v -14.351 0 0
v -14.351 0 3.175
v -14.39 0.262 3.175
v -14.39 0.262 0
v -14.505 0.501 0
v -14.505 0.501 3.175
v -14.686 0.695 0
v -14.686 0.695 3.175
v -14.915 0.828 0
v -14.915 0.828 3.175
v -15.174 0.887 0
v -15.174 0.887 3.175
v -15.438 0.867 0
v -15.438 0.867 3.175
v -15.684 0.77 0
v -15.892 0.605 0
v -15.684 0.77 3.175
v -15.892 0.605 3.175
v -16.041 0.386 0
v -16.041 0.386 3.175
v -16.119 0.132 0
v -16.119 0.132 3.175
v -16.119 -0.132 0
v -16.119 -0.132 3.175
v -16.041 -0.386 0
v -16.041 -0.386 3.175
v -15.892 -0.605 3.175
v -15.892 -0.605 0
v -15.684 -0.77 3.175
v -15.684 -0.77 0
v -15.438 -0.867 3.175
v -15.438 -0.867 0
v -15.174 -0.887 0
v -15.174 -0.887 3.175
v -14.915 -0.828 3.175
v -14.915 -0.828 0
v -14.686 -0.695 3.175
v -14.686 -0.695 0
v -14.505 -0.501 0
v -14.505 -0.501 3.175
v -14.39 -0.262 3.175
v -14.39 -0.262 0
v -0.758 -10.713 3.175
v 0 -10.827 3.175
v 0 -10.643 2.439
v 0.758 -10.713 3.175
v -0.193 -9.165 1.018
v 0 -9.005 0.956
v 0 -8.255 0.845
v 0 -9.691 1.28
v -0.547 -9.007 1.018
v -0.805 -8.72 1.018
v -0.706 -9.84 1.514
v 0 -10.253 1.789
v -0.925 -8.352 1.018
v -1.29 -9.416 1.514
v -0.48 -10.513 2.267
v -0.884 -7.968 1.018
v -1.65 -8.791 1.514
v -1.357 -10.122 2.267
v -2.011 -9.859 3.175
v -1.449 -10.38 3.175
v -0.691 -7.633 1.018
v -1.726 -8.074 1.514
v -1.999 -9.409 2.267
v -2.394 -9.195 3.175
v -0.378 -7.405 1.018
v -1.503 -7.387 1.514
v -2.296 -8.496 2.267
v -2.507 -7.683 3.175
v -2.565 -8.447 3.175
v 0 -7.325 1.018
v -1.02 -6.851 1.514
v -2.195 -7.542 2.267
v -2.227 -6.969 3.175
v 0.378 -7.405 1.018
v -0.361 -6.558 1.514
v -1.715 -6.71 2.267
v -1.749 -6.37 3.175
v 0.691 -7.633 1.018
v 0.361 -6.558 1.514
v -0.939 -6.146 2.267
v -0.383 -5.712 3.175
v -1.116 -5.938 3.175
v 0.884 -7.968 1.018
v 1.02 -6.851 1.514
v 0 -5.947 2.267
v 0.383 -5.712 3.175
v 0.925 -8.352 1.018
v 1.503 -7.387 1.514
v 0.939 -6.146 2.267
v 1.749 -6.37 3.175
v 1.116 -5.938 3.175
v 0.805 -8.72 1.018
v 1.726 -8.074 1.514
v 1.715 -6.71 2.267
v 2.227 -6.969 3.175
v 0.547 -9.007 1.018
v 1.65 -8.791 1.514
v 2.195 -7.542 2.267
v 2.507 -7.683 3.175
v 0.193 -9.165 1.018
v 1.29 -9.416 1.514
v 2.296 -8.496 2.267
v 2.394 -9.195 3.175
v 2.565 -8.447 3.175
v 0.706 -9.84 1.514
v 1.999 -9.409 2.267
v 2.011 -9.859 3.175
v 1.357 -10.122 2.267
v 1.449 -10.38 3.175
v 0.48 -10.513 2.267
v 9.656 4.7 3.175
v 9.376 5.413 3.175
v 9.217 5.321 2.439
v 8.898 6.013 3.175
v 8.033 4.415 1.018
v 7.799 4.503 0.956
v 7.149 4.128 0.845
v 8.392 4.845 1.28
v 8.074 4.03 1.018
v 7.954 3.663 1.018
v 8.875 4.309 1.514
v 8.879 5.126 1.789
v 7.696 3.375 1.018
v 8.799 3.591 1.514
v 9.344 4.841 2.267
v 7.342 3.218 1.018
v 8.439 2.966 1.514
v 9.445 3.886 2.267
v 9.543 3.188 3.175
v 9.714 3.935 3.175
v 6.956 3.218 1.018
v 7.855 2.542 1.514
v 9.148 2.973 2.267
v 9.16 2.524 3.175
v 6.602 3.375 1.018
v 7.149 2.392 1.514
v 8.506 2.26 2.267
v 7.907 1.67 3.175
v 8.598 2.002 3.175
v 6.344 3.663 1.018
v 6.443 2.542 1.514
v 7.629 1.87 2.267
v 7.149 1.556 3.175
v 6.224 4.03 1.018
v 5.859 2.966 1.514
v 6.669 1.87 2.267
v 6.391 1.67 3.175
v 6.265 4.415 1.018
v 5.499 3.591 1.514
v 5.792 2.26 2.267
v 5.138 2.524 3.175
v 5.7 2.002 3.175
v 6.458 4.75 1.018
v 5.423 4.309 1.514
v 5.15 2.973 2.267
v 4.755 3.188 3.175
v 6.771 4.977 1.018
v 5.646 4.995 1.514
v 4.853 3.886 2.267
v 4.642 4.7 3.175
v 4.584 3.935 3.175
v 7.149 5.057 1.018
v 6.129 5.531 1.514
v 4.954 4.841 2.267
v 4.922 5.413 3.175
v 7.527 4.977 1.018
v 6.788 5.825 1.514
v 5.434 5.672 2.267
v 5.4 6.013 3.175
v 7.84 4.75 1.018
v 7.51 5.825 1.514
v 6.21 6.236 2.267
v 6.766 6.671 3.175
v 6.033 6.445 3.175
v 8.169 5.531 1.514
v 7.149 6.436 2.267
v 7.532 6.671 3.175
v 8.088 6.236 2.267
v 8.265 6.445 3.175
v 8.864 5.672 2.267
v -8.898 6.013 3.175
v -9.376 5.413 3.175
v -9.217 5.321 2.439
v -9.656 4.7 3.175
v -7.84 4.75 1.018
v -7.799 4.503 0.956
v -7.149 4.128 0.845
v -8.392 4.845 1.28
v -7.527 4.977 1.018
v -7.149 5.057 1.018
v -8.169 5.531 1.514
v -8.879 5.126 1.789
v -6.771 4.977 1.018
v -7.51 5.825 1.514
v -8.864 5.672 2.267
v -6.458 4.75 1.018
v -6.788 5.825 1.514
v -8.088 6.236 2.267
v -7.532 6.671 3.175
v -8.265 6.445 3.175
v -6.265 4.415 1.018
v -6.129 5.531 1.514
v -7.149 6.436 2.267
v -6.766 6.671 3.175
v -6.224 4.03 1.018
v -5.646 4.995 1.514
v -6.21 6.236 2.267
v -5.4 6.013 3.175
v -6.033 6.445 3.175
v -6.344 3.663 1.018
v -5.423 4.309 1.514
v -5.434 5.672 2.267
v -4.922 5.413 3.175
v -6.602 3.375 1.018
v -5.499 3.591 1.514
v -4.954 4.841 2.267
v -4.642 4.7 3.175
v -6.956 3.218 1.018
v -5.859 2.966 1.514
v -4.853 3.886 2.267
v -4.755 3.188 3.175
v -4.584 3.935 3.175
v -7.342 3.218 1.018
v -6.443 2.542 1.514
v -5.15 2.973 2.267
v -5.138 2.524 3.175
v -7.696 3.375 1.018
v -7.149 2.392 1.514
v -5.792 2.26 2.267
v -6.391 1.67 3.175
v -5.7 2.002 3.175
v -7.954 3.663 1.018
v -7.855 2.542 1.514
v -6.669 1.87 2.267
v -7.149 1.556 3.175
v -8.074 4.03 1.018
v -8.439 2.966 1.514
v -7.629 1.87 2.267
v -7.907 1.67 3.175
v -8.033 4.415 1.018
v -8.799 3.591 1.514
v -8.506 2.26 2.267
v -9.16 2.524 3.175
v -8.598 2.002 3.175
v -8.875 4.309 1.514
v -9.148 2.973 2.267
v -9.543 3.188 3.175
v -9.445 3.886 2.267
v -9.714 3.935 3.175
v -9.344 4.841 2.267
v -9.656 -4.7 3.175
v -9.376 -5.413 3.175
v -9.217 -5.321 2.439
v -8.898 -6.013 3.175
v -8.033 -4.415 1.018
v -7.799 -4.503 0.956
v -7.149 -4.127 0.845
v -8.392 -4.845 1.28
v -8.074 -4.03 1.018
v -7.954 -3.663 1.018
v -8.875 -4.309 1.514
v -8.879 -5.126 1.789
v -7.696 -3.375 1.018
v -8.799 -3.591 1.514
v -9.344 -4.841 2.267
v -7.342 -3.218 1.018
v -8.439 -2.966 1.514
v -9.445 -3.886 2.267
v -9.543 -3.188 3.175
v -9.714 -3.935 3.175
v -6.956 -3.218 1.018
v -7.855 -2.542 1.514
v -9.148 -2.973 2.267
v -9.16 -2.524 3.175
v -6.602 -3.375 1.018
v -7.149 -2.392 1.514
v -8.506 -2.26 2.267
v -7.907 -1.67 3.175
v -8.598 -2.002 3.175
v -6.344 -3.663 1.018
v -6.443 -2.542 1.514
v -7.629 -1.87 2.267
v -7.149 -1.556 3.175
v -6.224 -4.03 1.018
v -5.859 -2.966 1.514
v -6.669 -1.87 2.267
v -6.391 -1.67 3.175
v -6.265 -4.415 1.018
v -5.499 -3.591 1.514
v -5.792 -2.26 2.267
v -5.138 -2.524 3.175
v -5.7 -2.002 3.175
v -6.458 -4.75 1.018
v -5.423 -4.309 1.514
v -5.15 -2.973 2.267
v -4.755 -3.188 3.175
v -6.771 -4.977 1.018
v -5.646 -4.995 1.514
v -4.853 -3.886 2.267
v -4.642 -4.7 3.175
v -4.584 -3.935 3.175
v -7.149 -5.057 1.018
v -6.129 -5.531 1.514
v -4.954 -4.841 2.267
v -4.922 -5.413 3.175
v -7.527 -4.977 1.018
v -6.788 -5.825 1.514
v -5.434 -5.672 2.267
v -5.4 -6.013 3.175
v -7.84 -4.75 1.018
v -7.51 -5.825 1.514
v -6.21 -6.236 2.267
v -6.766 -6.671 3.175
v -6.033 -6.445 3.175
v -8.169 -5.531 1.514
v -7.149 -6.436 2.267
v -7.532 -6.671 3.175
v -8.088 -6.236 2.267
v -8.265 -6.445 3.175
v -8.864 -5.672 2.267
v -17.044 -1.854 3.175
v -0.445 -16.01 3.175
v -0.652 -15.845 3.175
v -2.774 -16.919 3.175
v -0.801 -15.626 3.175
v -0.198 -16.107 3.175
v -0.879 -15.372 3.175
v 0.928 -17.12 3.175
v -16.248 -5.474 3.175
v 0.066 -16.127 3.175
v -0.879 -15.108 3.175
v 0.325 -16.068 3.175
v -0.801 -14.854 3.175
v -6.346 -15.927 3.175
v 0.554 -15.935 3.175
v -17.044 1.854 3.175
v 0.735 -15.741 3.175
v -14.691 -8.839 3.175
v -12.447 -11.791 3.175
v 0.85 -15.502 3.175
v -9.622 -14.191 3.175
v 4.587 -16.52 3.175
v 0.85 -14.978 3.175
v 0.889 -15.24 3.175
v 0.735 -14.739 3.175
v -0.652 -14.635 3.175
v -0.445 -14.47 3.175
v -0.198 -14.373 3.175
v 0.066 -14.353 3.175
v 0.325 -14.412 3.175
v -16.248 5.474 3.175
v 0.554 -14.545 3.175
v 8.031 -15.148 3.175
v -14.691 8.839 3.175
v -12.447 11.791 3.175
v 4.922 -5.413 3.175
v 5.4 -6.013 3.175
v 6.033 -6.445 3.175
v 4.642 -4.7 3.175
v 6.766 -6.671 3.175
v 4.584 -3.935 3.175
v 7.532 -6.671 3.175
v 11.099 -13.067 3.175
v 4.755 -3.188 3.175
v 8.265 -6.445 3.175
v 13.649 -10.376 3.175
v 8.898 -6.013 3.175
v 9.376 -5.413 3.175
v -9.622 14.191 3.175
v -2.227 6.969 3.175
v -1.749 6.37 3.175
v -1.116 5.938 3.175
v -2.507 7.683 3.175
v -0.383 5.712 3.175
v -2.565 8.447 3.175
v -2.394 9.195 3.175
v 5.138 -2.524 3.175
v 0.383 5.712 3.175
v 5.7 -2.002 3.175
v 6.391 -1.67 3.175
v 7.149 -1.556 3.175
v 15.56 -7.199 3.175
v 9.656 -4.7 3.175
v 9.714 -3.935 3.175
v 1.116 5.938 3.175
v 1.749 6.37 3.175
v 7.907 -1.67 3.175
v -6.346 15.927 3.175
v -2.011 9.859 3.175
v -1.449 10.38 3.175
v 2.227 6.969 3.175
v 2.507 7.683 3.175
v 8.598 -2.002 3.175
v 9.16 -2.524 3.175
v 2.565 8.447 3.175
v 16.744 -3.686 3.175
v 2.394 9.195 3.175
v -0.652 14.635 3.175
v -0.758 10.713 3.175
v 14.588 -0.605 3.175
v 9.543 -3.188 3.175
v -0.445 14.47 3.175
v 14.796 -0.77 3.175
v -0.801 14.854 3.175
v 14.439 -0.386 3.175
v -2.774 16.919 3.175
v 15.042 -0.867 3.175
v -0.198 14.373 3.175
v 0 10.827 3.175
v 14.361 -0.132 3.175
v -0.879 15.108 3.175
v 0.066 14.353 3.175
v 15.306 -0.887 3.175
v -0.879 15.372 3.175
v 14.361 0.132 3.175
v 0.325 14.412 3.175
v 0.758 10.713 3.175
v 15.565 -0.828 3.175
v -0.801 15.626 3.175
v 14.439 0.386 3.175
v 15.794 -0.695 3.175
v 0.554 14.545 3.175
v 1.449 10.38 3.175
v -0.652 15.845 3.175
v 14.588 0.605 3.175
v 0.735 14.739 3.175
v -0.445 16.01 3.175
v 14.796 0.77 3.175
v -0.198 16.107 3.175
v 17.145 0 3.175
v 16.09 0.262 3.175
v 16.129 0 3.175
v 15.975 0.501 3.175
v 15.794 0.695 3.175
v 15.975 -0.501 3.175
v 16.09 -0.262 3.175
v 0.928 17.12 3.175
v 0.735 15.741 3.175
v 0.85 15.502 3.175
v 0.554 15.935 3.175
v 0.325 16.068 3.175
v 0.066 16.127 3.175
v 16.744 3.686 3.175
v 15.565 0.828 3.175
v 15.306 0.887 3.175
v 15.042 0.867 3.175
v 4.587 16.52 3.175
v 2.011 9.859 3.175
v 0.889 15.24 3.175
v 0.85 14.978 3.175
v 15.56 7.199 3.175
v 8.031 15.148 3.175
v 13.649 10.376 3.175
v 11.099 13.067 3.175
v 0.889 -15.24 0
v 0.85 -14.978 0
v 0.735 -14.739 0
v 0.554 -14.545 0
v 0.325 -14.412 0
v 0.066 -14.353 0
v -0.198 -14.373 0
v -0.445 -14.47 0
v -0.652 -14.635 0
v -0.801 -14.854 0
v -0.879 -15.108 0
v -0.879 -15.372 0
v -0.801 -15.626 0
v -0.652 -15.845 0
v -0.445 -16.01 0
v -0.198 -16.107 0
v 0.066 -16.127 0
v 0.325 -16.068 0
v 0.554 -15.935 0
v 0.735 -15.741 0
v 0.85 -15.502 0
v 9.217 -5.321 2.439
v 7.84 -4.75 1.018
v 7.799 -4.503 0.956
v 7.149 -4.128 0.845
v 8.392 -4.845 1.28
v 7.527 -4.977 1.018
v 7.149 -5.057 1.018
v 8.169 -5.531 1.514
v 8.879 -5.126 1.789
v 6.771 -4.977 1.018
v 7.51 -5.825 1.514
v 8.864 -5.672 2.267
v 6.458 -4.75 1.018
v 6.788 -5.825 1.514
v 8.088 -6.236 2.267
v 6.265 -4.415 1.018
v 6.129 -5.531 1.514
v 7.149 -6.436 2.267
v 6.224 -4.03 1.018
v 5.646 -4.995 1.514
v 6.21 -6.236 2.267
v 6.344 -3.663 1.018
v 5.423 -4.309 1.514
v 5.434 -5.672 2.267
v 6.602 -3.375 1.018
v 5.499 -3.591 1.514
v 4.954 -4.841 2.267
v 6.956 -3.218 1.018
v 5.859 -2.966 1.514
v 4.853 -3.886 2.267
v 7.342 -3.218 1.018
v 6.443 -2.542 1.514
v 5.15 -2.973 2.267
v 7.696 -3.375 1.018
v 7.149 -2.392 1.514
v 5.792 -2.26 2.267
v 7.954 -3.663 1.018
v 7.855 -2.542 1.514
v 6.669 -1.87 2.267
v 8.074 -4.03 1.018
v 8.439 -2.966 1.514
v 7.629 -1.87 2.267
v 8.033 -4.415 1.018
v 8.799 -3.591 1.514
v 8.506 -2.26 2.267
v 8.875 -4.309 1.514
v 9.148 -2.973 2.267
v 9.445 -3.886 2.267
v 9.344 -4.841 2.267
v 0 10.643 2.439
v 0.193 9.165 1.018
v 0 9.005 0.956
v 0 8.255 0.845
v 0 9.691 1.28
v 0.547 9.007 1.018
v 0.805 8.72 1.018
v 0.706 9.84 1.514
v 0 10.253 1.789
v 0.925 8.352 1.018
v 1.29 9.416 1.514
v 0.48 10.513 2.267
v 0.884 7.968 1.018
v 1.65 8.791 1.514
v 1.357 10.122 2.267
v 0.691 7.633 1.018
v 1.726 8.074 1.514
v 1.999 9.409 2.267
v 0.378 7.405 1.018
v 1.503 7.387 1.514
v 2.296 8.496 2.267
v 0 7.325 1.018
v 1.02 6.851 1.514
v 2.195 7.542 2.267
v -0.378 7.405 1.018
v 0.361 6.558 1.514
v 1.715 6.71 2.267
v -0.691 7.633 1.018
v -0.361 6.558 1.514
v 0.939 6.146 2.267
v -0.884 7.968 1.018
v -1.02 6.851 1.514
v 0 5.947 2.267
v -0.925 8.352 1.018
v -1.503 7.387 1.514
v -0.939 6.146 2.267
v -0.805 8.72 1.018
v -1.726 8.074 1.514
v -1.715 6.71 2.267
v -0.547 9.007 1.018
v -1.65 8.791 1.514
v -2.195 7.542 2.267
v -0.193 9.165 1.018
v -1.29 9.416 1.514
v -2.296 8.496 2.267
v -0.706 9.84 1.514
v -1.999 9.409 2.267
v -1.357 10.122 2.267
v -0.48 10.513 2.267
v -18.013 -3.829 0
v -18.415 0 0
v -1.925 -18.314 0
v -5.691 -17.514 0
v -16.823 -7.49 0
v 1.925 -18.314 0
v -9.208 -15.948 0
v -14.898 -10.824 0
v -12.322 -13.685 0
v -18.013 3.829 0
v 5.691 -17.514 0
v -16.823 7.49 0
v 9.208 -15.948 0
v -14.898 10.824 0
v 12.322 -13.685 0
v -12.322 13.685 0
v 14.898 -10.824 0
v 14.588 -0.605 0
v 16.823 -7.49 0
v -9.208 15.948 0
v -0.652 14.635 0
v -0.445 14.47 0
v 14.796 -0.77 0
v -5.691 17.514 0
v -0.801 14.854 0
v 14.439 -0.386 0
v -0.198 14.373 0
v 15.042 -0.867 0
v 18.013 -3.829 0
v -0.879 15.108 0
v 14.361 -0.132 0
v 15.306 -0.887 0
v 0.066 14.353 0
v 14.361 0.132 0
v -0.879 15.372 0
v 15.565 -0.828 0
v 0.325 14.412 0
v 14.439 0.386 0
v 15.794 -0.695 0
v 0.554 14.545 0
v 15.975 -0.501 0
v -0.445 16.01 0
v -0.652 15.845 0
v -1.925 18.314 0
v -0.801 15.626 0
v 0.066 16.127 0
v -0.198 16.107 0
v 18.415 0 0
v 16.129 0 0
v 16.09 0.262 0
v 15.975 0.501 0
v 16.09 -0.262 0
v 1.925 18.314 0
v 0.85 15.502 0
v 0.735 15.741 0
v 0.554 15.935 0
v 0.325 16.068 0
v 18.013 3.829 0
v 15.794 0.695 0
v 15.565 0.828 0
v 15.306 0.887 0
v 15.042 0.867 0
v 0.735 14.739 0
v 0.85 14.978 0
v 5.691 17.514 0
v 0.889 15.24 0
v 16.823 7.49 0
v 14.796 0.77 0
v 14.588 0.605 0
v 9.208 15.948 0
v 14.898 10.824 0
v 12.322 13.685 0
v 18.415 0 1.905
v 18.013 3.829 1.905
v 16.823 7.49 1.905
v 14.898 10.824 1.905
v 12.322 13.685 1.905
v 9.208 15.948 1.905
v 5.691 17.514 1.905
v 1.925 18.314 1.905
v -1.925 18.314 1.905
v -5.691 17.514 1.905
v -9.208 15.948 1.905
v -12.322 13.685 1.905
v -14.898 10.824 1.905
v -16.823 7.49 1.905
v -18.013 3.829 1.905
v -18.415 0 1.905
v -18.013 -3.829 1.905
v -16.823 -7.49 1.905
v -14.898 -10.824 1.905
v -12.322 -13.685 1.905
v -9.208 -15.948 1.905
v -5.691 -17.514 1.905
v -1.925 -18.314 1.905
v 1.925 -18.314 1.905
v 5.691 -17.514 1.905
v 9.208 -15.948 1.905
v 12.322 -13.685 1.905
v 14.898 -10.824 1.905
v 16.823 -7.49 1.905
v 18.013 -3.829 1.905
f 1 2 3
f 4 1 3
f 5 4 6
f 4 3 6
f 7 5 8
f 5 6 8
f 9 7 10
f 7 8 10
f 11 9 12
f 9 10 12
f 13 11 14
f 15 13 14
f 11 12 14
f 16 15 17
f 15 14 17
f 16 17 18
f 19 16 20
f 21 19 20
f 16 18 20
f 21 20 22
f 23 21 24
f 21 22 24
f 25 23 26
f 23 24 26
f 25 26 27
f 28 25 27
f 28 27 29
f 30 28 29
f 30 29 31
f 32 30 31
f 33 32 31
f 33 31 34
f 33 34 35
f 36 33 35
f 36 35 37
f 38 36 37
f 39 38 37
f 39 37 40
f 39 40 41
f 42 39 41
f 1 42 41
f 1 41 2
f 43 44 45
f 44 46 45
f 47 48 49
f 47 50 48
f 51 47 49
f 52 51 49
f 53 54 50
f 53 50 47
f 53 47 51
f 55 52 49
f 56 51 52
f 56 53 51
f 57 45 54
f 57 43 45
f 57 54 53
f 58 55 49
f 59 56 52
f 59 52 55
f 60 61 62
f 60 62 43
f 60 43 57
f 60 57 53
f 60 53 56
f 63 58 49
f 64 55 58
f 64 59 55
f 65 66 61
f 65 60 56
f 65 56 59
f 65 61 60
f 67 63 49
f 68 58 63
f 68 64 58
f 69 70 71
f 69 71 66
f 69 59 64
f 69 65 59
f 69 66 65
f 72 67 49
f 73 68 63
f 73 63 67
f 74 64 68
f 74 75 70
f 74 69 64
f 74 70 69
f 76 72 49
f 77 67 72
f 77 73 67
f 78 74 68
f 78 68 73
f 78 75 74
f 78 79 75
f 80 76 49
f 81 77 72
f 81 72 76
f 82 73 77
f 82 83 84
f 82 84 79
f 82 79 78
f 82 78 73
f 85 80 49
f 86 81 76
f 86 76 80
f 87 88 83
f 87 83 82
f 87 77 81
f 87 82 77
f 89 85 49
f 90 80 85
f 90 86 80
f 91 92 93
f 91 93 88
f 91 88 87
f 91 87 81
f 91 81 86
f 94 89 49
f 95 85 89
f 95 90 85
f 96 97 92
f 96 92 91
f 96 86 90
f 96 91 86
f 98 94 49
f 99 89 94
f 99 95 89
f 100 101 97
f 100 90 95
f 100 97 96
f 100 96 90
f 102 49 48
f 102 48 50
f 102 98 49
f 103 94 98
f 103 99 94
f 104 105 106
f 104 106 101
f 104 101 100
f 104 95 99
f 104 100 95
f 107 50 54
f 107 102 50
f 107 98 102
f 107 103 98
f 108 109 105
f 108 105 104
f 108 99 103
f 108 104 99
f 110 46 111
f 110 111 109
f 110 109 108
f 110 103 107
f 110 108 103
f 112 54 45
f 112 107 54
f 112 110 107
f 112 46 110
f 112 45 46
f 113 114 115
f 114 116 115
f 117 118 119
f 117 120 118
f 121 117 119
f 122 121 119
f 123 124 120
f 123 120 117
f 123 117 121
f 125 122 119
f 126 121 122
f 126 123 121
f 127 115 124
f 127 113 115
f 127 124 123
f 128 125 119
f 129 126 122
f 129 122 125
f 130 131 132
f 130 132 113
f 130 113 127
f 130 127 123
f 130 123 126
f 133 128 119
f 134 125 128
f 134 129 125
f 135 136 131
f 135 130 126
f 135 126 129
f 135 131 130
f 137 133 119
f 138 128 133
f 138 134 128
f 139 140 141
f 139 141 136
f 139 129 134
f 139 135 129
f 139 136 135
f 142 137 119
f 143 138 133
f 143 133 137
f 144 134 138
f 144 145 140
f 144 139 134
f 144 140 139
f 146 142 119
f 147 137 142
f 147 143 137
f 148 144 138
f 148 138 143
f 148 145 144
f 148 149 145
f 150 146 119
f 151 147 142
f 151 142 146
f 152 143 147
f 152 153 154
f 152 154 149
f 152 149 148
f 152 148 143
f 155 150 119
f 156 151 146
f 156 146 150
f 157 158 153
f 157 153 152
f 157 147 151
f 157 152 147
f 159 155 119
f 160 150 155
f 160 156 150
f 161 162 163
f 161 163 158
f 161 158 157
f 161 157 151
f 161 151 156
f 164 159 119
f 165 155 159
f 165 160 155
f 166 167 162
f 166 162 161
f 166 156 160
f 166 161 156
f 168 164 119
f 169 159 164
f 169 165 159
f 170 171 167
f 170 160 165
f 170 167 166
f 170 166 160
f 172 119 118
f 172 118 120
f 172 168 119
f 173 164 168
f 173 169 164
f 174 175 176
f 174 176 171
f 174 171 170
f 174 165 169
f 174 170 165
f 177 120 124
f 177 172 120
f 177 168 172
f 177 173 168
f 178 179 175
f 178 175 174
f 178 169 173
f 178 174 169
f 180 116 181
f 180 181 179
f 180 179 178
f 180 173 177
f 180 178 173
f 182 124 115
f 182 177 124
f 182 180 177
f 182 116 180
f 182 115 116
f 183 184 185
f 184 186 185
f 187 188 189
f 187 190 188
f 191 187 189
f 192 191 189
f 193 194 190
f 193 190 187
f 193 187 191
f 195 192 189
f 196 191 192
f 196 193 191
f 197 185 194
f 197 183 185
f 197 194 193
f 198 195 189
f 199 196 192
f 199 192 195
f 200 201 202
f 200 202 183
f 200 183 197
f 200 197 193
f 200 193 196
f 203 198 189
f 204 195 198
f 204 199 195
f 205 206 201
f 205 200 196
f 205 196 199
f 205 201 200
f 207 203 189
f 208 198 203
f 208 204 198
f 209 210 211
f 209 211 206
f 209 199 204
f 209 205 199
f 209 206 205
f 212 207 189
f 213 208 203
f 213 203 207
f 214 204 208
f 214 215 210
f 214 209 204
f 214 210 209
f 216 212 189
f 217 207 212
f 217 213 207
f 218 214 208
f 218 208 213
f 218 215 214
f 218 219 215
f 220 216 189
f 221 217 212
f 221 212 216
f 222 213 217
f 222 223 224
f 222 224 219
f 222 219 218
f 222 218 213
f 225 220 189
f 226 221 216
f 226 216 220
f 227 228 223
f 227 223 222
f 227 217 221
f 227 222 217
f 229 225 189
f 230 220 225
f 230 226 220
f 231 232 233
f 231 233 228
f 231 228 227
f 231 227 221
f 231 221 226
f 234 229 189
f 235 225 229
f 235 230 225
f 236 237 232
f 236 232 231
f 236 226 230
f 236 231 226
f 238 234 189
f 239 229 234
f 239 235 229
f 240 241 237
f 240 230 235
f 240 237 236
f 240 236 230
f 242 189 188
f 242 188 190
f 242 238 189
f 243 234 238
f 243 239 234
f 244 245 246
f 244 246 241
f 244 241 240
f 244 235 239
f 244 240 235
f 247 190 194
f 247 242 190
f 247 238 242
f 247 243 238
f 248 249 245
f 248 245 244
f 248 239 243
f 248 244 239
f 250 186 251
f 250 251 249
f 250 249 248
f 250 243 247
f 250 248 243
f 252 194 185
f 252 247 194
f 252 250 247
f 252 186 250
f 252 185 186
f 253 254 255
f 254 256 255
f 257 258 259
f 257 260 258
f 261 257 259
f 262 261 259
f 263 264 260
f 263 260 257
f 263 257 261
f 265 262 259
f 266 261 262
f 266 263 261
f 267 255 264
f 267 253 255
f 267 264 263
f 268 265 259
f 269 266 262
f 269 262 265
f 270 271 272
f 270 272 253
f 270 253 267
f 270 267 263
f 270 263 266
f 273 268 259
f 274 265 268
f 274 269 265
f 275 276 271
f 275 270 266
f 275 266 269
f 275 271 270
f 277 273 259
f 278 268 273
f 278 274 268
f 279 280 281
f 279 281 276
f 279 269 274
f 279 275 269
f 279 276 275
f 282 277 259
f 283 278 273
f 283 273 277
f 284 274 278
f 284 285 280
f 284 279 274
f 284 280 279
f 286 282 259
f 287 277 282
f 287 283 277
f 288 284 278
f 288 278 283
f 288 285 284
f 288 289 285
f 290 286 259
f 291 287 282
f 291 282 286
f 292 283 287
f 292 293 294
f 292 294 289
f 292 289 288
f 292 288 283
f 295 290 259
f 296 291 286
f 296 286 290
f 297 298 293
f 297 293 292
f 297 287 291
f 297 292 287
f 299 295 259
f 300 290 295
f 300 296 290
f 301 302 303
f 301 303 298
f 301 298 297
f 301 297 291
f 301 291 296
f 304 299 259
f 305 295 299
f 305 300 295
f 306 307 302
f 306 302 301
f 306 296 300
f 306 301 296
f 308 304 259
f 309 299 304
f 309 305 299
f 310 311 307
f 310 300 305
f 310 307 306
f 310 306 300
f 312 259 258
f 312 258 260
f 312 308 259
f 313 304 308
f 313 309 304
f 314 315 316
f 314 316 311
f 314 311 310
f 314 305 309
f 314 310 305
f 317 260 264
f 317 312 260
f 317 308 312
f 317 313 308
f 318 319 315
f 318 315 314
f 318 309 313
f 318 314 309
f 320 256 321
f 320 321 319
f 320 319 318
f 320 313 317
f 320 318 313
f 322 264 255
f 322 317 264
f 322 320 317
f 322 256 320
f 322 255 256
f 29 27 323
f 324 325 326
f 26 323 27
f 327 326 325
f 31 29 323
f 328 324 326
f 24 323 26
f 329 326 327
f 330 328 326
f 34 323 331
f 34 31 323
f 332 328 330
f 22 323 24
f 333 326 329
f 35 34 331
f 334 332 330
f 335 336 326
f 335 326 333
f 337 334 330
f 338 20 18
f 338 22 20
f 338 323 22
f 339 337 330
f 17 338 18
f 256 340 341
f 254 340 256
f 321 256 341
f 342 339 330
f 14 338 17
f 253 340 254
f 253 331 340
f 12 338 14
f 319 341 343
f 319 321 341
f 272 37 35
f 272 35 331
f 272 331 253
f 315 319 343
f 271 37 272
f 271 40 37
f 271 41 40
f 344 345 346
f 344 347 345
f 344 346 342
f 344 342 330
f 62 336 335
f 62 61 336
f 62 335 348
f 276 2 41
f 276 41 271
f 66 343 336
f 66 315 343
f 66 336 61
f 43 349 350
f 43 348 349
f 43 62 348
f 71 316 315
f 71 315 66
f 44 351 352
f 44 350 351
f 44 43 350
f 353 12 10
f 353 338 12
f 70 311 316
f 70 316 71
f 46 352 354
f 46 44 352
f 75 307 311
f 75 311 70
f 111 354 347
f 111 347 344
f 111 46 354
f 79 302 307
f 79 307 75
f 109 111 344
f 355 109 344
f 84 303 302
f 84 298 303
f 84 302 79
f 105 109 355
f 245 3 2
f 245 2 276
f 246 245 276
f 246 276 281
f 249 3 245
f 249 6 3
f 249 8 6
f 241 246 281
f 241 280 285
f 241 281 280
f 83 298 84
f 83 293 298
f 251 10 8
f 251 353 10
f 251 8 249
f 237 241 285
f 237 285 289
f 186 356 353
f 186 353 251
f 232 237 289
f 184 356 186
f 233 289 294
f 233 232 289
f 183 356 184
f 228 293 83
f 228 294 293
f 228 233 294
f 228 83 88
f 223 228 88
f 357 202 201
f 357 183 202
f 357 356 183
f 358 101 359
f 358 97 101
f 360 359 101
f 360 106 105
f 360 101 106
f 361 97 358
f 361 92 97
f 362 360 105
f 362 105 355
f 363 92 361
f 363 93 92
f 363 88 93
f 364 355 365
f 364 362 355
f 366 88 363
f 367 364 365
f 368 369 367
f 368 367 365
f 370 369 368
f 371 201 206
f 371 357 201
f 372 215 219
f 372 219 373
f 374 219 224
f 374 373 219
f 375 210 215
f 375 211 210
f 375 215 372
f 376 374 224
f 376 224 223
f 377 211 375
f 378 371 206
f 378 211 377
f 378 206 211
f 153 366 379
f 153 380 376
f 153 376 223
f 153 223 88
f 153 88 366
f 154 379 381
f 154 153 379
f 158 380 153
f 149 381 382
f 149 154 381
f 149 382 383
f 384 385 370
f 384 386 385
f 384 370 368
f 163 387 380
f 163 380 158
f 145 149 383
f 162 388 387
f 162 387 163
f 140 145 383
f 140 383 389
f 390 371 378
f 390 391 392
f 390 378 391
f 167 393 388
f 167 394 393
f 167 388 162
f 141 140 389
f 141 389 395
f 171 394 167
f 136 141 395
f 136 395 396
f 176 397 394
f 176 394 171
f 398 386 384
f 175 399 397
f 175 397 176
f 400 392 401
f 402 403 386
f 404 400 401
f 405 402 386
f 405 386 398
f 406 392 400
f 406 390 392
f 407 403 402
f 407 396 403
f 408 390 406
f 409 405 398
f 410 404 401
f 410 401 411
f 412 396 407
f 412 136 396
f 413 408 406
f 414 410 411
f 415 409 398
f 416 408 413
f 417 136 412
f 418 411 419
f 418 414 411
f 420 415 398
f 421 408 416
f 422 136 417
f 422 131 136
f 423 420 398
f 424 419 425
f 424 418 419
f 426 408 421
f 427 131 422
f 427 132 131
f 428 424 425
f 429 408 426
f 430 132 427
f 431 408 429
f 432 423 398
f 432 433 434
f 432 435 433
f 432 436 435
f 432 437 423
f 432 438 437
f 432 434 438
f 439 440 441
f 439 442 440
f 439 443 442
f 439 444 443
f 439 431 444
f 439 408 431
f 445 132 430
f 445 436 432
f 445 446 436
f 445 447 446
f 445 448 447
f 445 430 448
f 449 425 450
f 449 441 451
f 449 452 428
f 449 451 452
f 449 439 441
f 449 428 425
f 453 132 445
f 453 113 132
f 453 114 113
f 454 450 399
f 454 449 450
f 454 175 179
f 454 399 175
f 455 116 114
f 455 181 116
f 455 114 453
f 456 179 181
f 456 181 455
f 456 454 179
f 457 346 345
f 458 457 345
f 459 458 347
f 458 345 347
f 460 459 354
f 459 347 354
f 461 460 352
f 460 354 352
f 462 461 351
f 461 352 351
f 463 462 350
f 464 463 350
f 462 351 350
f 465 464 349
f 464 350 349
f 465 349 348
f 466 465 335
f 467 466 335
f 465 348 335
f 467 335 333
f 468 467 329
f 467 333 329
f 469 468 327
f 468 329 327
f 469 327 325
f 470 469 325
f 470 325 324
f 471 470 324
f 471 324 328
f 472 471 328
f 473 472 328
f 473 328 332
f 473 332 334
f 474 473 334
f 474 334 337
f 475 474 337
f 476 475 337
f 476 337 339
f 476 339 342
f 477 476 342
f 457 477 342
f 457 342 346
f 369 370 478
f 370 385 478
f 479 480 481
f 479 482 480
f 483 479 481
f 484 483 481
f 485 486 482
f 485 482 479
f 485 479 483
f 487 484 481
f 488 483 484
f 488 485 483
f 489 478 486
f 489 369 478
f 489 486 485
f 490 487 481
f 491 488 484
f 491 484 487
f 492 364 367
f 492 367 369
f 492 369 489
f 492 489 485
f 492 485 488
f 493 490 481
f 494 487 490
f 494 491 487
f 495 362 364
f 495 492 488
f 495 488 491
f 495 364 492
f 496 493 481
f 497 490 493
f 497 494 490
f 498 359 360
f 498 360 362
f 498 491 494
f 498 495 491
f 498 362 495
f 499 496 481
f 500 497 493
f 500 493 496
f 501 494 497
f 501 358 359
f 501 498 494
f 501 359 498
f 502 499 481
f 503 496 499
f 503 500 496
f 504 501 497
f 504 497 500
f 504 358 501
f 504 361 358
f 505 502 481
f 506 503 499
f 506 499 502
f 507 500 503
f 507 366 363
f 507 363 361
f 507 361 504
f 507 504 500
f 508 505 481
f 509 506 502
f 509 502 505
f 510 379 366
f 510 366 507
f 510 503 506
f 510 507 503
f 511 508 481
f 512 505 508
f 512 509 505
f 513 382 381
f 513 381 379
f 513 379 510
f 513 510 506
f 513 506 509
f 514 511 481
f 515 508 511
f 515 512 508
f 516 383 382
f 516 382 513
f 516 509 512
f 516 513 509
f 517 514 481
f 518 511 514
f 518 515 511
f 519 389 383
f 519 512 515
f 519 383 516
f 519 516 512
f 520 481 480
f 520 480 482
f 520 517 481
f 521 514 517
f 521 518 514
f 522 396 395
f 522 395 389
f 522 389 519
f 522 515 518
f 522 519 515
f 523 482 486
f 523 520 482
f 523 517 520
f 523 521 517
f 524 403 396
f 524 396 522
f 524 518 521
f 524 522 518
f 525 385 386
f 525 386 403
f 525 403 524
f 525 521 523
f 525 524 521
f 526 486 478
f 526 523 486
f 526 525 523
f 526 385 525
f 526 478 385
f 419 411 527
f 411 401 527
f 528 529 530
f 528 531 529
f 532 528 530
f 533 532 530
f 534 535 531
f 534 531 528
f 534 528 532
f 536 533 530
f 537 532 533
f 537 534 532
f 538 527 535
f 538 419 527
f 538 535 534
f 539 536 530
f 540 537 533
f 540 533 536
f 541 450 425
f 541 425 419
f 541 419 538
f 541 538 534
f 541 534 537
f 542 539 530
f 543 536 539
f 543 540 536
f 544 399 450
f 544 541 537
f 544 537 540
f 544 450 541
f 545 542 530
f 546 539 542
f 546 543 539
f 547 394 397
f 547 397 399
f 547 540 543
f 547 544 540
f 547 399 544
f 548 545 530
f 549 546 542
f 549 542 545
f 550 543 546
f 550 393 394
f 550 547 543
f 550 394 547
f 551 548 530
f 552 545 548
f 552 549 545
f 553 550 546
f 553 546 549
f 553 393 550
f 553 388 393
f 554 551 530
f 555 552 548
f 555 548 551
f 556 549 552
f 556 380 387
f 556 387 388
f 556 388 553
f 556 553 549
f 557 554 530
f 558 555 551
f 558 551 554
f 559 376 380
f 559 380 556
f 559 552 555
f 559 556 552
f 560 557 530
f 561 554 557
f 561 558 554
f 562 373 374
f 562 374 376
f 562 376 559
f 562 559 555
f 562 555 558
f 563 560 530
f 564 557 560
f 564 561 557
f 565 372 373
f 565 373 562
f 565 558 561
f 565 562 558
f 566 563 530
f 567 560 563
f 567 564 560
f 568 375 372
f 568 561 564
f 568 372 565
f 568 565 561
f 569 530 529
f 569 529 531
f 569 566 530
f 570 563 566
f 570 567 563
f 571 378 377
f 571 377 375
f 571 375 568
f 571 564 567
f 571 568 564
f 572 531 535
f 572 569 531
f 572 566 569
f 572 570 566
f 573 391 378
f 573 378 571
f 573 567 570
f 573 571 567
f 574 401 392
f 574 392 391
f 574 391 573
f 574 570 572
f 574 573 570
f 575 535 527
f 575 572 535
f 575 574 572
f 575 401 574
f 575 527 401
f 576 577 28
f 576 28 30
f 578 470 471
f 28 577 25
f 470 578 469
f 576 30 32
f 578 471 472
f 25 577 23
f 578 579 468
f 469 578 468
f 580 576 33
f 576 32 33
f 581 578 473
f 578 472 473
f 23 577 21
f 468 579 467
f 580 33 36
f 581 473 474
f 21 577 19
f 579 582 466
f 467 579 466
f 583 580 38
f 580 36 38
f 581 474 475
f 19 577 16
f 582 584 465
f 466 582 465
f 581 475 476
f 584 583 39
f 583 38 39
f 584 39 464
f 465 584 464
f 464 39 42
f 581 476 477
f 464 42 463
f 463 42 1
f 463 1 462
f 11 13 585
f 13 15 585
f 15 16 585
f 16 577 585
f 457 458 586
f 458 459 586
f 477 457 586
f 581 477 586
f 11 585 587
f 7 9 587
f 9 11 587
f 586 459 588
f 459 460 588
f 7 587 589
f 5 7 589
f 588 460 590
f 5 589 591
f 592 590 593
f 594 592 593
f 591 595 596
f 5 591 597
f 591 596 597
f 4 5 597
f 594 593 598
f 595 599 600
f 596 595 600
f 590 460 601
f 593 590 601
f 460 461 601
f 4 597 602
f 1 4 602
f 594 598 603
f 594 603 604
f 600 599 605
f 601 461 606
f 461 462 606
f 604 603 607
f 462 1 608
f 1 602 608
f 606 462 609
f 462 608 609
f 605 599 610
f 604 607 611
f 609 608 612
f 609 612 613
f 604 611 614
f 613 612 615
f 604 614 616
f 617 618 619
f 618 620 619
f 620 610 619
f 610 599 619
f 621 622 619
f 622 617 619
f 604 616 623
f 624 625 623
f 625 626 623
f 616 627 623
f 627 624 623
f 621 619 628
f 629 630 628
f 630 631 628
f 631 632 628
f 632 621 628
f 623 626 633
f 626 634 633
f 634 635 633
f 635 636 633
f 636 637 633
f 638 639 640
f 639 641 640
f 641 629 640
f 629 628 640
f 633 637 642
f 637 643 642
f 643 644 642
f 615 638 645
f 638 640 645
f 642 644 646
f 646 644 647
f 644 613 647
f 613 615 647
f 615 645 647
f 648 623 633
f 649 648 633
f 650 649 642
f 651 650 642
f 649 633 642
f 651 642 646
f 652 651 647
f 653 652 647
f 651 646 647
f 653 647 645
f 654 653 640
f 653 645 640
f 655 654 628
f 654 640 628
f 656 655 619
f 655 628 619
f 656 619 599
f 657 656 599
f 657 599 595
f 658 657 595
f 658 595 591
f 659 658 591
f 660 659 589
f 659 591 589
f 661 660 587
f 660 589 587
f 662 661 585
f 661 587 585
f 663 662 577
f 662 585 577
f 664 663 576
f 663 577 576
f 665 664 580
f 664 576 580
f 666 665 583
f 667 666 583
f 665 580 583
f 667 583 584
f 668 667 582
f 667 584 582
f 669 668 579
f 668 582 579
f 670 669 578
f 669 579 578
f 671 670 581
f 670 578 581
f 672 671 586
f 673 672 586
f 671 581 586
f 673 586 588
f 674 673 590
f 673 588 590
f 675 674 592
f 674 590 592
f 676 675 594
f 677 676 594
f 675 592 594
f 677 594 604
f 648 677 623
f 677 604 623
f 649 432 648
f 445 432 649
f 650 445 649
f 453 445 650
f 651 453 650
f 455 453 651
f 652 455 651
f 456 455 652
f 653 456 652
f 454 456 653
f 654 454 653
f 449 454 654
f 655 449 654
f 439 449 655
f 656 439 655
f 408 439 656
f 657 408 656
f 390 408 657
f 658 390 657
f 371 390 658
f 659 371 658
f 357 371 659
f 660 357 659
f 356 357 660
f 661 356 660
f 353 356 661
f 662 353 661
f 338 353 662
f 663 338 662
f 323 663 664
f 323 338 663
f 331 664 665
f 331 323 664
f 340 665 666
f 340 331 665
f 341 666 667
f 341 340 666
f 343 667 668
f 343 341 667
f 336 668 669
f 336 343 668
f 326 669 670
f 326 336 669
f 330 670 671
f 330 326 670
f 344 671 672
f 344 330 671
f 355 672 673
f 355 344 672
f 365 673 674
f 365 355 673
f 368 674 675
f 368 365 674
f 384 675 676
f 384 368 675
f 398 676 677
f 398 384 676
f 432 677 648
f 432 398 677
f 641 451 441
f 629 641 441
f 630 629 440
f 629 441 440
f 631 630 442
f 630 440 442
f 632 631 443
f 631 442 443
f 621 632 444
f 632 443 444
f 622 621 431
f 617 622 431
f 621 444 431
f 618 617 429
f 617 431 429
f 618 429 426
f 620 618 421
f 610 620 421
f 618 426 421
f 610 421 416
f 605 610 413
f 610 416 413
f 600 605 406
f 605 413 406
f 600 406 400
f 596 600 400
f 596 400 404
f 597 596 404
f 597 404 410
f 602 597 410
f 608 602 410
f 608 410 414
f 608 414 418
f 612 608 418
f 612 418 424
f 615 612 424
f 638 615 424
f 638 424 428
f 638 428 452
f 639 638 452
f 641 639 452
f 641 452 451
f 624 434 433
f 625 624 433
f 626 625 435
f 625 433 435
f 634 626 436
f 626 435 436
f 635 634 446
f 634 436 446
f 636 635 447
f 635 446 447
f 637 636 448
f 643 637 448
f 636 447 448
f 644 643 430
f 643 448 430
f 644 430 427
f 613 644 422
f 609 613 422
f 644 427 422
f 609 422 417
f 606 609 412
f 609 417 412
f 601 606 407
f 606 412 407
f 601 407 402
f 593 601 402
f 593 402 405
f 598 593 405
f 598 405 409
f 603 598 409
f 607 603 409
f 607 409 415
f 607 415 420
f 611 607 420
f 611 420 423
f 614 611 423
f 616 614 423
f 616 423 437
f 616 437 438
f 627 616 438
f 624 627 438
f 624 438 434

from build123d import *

# Parameters (mm, degrees)
SKETCH1_R             = 18.415
BOSS_EXTRUDE1_DEPTH   = 3.175
CIRPATTERN1_COUNT     = 6
F_2_56_TAPPED_HOLE1_D = 1.778
CHAMFER1_SIZE         = 1.27


with BuildPart() as part:
    # Sketch1 → Boss-Extrude1 (new body)
    with BuildSketch(Plane.XY):
        Circle(SKETCH1_R)
    extrude(amount=BOSS_EXTRUDE1_DEPTH)

    # Sketch3 → Cut-Revolve1 (revolve, cut)
    with BuildSketch(Plane(origin=(0, 0, 0), x_dir=(0, 0, -1), z_dir=(1, 0, 0))):
        with BuildLine():
            Line((-6.01345, 8.255), (-0.84455, 8.255))
            ThreePointArc((-0.84455, 8.255), (-3.429, 10.83945), (-6.01345, 8.255))
        make_face()
    cut_revolve1 = revolve(axis=Axis((0, 8.255, 6.01345), (0, 0, -1)), mode=Mode.SUBTRACT)

    # CirPattern1: Cut-Revolve1 ×6 about axis
    cirpattern1_axis = Axis((0, 0, 3.175), (0, 0, -1))
    for i in range(1, CIRPATTERN1_COUNT):
        add(cut_revolve1.rotate(cirpattern1_axis, i * 360 / CIRPATTERN1_COUNT), mode=Mode.SUBTRACT)

    # #2-56 Tapped Hole1 (through all)
    with Locations(Plane(origin=(0, 0, 0), x_dir=(-1, 0, 0), z_dir=(0, 0, -1))):
        with Locations((0, 15.24), (15.24, 0), (0, -15.24), (-15.24, 0)):
            Hole(F_2_56_TAPPED_HOLE1_D / 2)

    # Chamfer1
    chamfer1_edges = [part.edges().sort_by_distance(p)[0] for p in [
        (-18.415, 0, 3.175),
    ]]
    chamfer(chamfer1_edges, length=CHAMFER1_SIZE)


solid = part.part
